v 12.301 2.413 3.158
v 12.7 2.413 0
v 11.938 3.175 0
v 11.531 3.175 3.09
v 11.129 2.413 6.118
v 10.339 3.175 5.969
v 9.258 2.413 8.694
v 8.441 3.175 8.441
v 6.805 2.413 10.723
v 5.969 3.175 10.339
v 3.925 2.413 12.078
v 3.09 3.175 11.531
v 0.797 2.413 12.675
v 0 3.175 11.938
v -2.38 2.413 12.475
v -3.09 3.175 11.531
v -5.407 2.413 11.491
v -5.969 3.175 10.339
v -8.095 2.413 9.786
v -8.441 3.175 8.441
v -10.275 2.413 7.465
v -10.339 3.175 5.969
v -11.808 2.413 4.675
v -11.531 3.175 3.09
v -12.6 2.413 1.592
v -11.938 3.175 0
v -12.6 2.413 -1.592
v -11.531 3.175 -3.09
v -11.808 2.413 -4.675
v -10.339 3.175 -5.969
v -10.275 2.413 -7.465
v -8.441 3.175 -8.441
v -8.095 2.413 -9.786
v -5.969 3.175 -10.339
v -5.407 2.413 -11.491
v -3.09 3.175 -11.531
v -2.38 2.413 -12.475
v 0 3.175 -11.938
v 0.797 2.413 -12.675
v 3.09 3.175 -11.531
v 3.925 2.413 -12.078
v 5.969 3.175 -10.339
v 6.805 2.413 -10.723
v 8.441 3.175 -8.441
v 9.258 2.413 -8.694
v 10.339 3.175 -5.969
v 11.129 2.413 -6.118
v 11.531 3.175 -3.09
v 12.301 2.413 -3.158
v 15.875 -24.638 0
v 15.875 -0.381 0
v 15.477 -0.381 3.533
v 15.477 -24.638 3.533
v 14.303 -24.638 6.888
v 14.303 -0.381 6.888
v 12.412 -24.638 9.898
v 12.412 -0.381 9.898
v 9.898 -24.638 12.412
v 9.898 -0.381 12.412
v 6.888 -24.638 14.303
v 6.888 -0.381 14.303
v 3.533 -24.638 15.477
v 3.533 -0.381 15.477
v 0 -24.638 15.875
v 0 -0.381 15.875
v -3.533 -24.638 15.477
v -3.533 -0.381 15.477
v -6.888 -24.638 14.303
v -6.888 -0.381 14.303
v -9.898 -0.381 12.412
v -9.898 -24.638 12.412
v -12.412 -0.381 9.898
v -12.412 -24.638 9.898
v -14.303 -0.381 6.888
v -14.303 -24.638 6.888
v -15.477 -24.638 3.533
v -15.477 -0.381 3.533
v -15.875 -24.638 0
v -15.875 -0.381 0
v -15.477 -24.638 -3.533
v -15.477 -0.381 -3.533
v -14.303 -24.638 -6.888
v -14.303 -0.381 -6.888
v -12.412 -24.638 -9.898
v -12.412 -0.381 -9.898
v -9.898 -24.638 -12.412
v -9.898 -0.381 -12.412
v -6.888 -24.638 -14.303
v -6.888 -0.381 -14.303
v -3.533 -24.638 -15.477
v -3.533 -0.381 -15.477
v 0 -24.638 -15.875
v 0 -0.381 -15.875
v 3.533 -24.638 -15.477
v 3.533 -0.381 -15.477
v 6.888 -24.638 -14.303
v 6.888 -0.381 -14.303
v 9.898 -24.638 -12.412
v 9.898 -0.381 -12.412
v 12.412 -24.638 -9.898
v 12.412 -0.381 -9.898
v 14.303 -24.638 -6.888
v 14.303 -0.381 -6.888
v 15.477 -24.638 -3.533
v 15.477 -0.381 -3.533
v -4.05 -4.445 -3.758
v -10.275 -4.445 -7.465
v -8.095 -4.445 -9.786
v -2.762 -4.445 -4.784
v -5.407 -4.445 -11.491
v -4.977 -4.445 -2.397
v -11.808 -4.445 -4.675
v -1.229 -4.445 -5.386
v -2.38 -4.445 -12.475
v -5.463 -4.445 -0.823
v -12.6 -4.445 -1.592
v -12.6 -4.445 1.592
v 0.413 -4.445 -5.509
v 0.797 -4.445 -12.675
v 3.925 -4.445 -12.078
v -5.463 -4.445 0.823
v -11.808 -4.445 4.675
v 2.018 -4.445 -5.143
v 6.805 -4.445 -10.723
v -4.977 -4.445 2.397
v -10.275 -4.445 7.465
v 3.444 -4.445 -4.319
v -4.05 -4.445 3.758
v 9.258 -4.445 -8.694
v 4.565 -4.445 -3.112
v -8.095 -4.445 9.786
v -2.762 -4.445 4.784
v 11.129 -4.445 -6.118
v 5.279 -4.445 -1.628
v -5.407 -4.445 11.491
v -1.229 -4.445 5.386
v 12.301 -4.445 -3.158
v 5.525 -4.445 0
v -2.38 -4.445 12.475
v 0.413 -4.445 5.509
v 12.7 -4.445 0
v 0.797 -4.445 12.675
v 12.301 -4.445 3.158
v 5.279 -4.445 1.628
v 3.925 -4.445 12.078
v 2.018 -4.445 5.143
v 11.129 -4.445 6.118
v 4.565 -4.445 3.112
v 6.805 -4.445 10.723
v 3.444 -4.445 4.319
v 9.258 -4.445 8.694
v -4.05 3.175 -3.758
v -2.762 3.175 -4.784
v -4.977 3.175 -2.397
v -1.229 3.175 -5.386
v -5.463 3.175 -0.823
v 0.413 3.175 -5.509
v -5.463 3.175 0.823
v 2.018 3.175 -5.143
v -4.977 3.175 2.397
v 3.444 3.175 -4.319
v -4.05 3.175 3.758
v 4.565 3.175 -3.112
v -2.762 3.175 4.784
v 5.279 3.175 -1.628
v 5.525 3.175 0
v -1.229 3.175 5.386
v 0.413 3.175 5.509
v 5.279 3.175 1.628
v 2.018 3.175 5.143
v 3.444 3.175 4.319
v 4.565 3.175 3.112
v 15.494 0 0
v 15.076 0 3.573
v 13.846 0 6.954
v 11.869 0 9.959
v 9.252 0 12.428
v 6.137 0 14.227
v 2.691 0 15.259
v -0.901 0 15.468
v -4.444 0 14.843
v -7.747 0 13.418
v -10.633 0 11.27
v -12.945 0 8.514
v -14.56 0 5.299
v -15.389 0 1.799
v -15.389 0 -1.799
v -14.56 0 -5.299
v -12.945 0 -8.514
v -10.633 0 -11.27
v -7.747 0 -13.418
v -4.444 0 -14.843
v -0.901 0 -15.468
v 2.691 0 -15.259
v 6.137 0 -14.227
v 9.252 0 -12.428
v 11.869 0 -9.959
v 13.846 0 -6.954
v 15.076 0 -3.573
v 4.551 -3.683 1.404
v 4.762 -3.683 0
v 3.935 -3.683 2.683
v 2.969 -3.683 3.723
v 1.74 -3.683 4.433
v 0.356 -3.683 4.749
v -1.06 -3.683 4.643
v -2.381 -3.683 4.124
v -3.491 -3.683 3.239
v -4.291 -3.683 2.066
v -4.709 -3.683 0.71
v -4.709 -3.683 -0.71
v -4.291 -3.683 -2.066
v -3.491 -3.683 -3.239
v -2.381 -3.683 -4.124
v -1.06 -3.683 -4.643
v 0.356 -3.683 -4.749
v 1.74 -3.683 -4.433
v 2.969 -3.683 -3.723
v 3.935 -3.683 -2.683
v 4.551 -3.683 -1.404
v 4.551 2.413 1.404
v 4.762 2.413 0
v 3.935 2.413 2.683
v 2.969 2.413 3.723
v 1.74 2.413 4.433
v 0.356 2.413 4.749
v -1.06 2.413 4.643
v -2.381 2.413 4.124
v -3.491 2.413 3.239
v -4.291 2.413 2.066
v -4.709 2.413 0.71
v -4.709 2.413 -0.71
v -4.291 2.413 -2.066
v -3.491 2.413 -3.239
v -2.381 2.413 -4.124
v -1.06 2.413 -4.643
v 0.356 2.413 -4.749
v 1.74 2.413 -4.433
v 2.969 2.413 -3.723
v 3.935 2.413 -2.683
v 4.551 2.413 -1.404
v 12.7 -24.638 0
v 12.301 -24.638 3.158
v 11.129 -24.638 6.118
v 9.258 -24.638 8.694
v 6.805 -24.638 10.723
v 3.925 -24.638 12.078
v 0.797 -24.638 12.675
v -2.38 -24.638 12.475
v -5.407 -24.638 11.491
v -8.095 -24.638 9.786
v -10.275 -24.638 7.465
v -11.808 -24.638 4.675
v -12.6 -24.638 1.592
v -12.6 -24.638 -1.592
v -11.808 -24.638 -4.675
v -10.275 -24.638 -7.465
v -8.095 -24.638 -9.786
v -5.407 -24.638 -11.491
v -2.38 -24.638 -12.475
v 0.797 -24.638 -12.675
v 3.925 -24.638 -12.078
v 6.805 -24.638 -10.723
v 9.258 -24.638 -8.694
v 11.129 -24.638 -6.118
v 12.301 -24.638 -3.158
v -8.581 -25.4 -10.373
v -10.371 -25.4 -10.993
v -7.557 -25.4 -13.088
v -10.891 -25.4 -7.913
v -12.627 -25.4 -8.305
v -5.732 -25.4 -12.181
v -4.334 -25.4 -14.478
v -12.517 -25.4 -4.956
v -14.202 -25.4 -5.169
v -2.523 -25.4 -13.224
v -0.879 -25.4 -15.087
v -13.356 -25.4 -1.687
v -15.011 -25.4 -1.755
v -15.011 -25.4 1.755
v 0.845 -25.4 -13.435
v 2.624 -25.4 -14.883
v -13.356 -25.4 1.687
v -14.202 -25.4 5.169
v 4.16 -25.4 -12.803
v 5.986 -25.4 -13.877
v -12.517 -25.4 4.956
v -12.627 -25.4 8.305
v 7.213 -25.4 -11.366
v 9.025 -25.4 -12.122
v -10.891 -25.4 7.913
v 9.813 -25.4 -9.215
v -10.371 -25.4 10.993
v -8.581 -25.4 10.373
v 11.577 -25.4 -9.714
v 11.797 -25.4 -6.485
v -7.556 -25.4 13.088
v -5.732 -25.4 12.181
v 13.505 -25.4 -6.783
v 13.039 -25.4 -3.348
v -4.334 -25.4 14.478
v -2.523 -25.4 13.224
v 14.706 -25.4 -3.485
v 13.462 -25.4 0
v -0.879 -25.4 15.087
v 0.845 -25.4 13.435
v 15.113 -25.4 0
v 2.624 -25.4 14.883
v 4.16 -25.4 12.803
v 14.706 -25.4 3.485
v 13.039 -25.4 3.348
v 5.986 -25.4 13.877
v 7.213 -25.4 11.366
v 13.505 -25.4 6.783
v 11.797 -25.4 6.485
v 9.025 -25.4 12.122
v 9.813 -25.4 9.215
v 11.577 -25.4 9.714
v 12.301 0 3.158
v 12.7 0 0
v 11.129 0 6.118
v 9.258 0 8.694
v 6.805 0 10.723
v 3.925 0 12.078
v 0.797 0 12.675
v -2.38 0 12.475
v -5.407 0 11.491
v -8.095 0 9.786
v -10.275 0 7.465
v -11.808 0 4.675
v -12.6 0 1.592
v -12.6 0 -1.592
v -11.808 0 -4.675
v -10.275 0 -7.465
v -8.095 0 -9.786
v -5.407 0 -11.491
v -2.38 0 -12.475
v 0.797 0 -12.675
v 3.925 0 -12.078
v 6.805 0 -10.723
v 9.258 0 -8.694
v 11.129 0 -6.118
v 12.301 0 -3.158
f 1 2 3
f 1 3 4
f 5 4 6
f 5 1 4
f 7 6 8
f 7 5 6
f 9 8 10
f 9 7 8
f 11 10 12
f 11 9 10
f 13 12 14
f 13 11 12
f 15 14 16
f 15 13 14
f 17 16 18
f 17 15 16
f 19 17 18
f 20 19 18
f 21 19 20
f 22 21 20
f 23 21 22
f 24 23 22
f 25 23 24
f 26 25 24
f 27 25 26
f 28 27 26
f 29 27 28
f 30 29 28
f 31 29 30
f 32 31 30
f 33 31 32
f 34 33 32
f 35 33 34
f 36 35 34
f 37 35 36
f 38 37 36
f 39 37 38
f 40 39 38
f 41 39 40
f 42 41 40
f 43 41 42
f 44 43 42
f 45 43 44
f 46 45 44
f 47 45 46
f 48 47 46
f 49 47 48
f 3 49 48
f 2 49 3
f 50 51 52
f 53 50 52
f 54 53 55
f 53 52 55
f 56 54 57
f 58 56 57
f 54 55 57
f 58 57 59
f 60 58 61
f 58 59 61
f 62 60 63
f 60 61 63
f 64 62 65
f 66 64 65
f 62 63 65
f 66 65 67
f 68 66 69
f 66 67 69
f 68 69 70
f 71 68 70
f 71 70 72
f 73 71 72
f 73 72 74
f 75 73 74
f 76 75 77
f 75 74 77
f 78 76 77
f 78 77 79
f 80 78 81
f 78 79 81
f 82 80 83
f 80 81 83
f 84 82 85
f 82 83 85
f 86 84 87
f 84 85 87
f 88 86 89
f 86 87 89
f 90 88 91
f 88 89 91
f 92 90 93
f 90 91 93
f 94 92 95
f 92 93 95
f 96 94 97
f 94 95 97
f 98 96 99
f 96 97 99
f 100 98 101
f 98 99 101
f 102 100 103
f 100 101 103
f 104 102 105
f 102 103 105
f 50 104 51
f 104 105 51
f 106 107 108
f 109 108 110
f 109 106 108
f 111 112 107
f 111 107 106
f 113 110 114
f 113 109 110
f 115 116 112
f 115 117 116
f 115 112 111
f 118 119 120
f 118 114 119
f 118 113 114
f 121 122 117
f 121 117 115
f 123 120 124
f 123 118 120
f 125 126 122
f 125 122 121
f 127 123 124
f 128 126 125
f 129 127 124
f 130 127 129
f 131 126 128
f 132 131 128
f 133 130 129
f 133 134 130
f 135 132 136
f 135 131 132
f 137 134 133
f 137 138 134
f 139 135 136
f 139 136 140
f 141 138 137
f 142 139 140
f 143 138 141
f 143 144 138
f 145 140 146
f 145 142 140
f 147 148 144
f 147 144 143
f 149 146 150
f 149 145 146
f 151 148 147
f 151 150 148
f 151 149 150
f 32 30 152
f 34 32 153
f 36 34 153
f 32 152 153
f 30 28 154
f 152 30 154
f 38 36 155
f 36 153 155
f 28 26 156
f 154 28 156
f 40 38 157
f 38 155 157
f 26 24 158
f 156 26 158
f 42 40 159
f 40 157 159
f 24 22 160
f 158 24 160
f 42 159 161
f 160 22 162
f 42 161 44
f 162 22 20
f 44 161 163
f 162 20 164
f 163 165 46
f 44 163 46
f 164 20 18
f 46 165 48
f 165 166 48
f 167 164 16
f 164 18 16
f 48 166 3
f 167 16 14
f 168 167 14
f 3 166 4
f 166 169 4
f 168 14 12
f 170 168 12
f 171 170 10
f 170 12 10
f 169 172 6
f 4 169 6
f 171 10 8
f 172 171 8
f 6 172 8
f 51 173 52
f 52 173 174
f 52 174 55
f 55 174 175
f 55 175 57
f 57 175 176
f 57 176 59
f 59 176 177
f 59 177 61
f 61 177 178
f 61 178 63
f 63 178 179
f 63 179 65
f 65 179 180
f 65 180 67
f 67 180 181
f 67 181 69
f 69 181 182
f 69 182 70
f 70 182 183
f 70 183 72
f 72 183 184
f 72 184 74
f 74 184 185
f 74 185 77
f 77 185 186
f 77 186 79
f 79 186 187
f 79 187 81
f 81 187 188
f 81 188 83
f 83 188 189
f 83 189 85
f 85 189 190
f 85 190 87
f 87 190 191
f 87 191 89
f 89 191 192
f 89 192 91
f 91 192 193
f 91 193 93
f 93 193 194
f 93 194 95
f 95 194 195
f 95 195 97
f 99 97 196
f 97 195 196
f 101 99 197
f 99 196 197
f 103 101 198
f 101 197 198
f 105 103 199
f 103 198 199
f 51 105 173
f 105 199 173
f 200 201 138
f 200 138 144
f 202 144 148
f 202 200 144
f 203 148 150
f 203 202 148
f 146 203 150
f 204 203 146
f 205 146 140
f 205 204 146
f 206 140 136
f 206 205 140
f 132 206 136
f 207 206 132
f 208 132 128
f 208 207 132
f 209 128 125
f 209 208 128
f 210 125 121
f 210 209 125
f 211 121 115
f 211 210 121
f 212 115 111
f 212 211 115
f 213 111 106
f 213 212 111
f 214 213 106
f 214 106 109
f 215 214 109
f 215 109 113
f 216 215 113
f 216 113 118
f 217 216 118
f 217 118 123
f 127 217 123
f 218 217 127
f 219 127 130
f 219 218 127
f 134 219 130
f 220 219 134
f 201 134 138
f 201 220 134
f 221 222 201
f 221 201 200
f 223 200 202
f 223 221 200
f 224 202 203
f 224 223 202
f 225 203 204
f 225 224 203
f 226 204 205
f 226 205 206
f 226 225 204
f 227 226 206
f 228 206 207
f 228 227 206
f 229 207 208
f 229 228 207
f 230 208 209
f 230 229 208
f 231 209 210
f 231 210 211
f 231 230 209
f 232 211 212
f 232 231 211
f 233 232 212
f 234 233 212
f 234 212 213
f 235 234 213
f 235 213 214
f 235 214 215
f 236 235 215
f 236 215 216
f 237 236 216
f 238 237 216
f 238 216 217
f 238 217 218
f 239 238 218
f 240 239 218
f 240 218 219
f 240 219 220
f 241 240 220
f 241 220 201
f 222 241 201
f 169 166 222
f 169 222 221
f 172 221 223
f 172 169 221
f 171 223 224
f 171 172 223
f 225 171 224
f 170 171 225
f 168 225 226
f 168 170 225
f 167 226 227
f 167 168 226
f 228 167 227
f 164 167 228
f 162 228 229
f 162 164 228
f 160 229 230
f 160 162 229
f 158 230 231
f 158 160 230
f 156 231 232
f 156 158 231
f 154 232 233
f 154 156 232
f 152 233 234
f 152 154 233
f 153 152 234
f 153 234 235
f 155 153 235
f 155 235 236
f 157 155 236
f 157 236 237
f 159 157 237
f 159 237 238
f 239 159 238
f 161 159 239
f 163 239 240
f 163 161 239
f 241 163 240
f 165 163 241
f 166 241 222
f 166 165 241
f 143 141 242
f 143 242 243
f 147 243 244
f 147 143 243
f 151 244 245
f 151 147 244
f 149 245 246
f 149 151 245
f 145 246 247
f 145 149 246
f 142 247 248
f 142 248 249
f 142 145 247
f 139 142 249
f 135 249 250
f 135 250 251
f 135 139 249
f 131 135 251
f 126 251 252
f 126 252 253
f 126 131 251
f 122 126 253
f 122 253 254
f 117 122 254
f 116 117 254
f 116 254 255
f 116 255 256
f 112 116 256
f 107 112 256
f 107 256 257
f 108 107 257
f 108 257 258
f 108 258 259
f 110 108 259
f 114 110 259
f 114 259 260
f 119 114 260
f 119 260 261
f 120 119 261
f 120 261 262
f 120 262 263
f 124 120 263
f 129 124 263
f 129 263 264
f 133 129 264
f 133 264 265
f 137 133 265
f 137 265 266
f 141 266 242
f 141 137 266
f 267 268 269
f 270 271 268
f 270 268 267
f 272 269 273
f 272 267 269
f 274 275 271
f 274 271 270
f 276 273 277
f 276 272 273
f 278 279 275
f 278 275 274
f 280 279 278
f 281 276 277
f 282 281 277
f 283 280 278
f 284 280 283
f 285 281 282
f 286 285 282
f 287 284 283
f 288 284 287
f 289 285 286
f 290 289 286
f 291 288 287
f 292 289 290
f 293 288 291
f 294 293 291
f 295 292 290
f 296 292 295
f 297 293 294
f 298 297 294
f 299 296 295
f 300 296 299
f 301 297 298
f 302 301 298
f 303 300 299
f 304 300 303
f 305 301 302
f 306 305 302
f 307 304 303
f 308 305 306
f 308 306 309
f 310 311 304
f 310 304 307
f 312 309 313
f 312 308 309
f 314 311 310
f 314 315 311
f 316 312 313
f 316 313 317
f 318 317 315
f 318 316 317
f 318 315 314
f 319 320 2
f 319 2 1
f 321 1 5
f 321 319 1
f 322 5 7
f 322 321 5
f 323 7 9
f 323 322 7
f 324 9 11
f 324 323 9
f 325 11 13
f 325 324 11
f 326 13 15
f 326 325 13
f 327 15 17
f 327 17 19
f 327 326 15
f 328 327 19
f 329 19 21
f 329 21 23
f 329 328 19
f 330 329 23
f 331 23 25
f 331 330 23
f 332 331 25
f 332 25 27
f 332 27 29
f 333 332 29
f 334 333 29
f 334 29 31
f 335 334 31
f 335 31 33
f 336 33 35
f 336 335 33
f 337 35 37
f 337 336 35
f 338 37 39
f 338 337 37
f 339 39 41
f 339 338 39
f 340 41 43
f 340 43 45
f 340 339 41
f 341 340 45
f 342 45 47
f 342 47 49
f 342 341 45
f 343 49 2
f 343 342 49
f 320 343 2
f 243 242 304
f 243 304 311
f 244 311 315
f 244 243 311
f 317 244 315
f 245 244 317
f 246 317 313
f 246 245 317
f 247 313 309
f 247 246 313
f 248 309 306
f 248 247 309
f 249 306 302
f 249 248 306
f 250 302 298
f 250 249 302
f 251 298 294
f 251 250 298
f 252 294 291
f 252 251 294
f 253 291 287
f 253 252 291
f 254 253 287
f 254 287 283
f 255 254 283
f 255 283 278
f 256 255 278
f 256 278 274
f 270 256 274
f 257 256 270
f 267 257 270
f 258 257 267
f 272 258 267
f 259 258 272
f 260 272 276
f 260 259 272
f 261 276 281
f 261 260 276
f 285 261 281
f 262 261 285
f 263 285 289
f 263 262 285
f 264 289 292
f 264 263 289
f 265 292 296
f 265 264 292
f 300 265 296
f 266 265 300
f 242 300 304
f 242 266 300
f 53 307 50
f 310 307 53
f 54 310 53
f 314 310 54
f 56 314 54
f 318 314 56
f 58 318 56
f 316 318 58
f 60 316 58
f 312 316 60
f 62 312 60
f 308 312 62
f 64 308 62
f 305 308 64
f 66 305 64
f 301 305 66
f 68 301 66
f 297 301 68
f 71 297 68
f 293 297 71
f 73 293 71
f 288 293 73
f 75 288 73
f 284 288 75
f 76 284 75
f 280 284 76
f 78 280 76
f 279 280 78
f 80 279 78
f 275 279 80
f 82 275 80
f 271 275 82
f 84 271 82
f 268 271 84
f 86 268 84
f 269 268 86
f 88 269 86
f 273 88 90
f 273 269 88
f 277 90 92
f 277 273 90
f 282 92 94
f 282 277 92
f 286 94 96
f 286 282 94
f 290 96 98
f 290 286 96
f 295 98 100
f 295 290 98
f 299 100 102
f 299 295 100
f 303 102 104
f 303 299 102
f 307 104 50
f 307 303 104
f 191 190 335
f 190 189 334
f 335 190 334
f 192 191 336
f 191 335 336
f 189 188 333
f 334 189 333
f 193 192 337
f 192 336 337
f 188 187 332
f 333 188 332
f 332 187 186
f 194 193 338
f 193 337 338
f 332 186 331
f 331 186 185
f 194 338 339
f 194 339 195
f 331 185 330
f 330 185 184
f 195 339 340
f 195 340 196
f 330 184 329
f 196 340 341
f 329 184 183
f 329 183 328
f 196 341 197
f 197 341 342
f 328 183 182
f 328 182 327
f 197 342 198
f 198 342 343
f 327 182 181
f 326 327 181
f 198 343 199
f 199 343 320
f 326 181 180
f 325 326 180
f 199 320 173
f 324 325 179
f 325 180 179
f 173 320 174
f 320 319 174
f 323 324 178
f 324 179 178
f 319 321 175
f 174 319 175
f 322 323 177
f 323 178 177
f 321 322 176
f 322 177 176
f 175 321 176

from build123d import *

# Parameters (mm, degrees)
F0_R     = 12.7
F0_R_2   = 4.7625
F1_DEPTH = 3.175
F2_R     = 15.875
F2_R_2   = 4.7625
F3_DEPTH = 4.445
F4_R     = 15.875
F4_R_2   = 12.7
F5_DEPTH = 25.4
F6_SIZE  = 0.762
F7_SIZE  = 0.381


with BuildPart() as f1:
    # F0 (on Front) → F1 (new body)
    with BuildSketch(Plane.XZ):
        Circle(F0_R)
        Circle(F0_R_2, mode=Mode.SUBTRACT)
    extrude(amount=-F1_DEPTH)

    # F2 (on Front) → F3 (join)
    with BuildSketch(Plane.XZ):
        Circle(F2_R)
        Circle(F2_R_2, mode=Mode.SUBTRACT)
    extrude(amount=F3_DEPTH)

    # F4 (on Front) → F5 (join)
    with BuildSketch(Plane.XZ):
        Circle(F4_R)
        Circle(F4_R_2, mode=Mode.SUBTRACT)
    extrude(amount=F5_DEPTH)

    # F6
    f6_edges = [f1.edges().sort_by_distance(p)[0] for p in [
        (-12.7, -25.4, 0),
        (-15.875, -25.4, 0),
        (-4.7625, -4.445, 0),
        (-12.7, 3.175, 0),
        (-4.7625, 3.175, 0),
    ]]
    chamfer(f6_edges, length=F6_SIZE)

    # F7
    f7_edges = [f1.edges().sort_by_distance(p)[0] for p in [
        (-15.875, 0, 0),
    ]]
    chamfer(f7_edges, length=F7_SIZE)


solid = f1.part
